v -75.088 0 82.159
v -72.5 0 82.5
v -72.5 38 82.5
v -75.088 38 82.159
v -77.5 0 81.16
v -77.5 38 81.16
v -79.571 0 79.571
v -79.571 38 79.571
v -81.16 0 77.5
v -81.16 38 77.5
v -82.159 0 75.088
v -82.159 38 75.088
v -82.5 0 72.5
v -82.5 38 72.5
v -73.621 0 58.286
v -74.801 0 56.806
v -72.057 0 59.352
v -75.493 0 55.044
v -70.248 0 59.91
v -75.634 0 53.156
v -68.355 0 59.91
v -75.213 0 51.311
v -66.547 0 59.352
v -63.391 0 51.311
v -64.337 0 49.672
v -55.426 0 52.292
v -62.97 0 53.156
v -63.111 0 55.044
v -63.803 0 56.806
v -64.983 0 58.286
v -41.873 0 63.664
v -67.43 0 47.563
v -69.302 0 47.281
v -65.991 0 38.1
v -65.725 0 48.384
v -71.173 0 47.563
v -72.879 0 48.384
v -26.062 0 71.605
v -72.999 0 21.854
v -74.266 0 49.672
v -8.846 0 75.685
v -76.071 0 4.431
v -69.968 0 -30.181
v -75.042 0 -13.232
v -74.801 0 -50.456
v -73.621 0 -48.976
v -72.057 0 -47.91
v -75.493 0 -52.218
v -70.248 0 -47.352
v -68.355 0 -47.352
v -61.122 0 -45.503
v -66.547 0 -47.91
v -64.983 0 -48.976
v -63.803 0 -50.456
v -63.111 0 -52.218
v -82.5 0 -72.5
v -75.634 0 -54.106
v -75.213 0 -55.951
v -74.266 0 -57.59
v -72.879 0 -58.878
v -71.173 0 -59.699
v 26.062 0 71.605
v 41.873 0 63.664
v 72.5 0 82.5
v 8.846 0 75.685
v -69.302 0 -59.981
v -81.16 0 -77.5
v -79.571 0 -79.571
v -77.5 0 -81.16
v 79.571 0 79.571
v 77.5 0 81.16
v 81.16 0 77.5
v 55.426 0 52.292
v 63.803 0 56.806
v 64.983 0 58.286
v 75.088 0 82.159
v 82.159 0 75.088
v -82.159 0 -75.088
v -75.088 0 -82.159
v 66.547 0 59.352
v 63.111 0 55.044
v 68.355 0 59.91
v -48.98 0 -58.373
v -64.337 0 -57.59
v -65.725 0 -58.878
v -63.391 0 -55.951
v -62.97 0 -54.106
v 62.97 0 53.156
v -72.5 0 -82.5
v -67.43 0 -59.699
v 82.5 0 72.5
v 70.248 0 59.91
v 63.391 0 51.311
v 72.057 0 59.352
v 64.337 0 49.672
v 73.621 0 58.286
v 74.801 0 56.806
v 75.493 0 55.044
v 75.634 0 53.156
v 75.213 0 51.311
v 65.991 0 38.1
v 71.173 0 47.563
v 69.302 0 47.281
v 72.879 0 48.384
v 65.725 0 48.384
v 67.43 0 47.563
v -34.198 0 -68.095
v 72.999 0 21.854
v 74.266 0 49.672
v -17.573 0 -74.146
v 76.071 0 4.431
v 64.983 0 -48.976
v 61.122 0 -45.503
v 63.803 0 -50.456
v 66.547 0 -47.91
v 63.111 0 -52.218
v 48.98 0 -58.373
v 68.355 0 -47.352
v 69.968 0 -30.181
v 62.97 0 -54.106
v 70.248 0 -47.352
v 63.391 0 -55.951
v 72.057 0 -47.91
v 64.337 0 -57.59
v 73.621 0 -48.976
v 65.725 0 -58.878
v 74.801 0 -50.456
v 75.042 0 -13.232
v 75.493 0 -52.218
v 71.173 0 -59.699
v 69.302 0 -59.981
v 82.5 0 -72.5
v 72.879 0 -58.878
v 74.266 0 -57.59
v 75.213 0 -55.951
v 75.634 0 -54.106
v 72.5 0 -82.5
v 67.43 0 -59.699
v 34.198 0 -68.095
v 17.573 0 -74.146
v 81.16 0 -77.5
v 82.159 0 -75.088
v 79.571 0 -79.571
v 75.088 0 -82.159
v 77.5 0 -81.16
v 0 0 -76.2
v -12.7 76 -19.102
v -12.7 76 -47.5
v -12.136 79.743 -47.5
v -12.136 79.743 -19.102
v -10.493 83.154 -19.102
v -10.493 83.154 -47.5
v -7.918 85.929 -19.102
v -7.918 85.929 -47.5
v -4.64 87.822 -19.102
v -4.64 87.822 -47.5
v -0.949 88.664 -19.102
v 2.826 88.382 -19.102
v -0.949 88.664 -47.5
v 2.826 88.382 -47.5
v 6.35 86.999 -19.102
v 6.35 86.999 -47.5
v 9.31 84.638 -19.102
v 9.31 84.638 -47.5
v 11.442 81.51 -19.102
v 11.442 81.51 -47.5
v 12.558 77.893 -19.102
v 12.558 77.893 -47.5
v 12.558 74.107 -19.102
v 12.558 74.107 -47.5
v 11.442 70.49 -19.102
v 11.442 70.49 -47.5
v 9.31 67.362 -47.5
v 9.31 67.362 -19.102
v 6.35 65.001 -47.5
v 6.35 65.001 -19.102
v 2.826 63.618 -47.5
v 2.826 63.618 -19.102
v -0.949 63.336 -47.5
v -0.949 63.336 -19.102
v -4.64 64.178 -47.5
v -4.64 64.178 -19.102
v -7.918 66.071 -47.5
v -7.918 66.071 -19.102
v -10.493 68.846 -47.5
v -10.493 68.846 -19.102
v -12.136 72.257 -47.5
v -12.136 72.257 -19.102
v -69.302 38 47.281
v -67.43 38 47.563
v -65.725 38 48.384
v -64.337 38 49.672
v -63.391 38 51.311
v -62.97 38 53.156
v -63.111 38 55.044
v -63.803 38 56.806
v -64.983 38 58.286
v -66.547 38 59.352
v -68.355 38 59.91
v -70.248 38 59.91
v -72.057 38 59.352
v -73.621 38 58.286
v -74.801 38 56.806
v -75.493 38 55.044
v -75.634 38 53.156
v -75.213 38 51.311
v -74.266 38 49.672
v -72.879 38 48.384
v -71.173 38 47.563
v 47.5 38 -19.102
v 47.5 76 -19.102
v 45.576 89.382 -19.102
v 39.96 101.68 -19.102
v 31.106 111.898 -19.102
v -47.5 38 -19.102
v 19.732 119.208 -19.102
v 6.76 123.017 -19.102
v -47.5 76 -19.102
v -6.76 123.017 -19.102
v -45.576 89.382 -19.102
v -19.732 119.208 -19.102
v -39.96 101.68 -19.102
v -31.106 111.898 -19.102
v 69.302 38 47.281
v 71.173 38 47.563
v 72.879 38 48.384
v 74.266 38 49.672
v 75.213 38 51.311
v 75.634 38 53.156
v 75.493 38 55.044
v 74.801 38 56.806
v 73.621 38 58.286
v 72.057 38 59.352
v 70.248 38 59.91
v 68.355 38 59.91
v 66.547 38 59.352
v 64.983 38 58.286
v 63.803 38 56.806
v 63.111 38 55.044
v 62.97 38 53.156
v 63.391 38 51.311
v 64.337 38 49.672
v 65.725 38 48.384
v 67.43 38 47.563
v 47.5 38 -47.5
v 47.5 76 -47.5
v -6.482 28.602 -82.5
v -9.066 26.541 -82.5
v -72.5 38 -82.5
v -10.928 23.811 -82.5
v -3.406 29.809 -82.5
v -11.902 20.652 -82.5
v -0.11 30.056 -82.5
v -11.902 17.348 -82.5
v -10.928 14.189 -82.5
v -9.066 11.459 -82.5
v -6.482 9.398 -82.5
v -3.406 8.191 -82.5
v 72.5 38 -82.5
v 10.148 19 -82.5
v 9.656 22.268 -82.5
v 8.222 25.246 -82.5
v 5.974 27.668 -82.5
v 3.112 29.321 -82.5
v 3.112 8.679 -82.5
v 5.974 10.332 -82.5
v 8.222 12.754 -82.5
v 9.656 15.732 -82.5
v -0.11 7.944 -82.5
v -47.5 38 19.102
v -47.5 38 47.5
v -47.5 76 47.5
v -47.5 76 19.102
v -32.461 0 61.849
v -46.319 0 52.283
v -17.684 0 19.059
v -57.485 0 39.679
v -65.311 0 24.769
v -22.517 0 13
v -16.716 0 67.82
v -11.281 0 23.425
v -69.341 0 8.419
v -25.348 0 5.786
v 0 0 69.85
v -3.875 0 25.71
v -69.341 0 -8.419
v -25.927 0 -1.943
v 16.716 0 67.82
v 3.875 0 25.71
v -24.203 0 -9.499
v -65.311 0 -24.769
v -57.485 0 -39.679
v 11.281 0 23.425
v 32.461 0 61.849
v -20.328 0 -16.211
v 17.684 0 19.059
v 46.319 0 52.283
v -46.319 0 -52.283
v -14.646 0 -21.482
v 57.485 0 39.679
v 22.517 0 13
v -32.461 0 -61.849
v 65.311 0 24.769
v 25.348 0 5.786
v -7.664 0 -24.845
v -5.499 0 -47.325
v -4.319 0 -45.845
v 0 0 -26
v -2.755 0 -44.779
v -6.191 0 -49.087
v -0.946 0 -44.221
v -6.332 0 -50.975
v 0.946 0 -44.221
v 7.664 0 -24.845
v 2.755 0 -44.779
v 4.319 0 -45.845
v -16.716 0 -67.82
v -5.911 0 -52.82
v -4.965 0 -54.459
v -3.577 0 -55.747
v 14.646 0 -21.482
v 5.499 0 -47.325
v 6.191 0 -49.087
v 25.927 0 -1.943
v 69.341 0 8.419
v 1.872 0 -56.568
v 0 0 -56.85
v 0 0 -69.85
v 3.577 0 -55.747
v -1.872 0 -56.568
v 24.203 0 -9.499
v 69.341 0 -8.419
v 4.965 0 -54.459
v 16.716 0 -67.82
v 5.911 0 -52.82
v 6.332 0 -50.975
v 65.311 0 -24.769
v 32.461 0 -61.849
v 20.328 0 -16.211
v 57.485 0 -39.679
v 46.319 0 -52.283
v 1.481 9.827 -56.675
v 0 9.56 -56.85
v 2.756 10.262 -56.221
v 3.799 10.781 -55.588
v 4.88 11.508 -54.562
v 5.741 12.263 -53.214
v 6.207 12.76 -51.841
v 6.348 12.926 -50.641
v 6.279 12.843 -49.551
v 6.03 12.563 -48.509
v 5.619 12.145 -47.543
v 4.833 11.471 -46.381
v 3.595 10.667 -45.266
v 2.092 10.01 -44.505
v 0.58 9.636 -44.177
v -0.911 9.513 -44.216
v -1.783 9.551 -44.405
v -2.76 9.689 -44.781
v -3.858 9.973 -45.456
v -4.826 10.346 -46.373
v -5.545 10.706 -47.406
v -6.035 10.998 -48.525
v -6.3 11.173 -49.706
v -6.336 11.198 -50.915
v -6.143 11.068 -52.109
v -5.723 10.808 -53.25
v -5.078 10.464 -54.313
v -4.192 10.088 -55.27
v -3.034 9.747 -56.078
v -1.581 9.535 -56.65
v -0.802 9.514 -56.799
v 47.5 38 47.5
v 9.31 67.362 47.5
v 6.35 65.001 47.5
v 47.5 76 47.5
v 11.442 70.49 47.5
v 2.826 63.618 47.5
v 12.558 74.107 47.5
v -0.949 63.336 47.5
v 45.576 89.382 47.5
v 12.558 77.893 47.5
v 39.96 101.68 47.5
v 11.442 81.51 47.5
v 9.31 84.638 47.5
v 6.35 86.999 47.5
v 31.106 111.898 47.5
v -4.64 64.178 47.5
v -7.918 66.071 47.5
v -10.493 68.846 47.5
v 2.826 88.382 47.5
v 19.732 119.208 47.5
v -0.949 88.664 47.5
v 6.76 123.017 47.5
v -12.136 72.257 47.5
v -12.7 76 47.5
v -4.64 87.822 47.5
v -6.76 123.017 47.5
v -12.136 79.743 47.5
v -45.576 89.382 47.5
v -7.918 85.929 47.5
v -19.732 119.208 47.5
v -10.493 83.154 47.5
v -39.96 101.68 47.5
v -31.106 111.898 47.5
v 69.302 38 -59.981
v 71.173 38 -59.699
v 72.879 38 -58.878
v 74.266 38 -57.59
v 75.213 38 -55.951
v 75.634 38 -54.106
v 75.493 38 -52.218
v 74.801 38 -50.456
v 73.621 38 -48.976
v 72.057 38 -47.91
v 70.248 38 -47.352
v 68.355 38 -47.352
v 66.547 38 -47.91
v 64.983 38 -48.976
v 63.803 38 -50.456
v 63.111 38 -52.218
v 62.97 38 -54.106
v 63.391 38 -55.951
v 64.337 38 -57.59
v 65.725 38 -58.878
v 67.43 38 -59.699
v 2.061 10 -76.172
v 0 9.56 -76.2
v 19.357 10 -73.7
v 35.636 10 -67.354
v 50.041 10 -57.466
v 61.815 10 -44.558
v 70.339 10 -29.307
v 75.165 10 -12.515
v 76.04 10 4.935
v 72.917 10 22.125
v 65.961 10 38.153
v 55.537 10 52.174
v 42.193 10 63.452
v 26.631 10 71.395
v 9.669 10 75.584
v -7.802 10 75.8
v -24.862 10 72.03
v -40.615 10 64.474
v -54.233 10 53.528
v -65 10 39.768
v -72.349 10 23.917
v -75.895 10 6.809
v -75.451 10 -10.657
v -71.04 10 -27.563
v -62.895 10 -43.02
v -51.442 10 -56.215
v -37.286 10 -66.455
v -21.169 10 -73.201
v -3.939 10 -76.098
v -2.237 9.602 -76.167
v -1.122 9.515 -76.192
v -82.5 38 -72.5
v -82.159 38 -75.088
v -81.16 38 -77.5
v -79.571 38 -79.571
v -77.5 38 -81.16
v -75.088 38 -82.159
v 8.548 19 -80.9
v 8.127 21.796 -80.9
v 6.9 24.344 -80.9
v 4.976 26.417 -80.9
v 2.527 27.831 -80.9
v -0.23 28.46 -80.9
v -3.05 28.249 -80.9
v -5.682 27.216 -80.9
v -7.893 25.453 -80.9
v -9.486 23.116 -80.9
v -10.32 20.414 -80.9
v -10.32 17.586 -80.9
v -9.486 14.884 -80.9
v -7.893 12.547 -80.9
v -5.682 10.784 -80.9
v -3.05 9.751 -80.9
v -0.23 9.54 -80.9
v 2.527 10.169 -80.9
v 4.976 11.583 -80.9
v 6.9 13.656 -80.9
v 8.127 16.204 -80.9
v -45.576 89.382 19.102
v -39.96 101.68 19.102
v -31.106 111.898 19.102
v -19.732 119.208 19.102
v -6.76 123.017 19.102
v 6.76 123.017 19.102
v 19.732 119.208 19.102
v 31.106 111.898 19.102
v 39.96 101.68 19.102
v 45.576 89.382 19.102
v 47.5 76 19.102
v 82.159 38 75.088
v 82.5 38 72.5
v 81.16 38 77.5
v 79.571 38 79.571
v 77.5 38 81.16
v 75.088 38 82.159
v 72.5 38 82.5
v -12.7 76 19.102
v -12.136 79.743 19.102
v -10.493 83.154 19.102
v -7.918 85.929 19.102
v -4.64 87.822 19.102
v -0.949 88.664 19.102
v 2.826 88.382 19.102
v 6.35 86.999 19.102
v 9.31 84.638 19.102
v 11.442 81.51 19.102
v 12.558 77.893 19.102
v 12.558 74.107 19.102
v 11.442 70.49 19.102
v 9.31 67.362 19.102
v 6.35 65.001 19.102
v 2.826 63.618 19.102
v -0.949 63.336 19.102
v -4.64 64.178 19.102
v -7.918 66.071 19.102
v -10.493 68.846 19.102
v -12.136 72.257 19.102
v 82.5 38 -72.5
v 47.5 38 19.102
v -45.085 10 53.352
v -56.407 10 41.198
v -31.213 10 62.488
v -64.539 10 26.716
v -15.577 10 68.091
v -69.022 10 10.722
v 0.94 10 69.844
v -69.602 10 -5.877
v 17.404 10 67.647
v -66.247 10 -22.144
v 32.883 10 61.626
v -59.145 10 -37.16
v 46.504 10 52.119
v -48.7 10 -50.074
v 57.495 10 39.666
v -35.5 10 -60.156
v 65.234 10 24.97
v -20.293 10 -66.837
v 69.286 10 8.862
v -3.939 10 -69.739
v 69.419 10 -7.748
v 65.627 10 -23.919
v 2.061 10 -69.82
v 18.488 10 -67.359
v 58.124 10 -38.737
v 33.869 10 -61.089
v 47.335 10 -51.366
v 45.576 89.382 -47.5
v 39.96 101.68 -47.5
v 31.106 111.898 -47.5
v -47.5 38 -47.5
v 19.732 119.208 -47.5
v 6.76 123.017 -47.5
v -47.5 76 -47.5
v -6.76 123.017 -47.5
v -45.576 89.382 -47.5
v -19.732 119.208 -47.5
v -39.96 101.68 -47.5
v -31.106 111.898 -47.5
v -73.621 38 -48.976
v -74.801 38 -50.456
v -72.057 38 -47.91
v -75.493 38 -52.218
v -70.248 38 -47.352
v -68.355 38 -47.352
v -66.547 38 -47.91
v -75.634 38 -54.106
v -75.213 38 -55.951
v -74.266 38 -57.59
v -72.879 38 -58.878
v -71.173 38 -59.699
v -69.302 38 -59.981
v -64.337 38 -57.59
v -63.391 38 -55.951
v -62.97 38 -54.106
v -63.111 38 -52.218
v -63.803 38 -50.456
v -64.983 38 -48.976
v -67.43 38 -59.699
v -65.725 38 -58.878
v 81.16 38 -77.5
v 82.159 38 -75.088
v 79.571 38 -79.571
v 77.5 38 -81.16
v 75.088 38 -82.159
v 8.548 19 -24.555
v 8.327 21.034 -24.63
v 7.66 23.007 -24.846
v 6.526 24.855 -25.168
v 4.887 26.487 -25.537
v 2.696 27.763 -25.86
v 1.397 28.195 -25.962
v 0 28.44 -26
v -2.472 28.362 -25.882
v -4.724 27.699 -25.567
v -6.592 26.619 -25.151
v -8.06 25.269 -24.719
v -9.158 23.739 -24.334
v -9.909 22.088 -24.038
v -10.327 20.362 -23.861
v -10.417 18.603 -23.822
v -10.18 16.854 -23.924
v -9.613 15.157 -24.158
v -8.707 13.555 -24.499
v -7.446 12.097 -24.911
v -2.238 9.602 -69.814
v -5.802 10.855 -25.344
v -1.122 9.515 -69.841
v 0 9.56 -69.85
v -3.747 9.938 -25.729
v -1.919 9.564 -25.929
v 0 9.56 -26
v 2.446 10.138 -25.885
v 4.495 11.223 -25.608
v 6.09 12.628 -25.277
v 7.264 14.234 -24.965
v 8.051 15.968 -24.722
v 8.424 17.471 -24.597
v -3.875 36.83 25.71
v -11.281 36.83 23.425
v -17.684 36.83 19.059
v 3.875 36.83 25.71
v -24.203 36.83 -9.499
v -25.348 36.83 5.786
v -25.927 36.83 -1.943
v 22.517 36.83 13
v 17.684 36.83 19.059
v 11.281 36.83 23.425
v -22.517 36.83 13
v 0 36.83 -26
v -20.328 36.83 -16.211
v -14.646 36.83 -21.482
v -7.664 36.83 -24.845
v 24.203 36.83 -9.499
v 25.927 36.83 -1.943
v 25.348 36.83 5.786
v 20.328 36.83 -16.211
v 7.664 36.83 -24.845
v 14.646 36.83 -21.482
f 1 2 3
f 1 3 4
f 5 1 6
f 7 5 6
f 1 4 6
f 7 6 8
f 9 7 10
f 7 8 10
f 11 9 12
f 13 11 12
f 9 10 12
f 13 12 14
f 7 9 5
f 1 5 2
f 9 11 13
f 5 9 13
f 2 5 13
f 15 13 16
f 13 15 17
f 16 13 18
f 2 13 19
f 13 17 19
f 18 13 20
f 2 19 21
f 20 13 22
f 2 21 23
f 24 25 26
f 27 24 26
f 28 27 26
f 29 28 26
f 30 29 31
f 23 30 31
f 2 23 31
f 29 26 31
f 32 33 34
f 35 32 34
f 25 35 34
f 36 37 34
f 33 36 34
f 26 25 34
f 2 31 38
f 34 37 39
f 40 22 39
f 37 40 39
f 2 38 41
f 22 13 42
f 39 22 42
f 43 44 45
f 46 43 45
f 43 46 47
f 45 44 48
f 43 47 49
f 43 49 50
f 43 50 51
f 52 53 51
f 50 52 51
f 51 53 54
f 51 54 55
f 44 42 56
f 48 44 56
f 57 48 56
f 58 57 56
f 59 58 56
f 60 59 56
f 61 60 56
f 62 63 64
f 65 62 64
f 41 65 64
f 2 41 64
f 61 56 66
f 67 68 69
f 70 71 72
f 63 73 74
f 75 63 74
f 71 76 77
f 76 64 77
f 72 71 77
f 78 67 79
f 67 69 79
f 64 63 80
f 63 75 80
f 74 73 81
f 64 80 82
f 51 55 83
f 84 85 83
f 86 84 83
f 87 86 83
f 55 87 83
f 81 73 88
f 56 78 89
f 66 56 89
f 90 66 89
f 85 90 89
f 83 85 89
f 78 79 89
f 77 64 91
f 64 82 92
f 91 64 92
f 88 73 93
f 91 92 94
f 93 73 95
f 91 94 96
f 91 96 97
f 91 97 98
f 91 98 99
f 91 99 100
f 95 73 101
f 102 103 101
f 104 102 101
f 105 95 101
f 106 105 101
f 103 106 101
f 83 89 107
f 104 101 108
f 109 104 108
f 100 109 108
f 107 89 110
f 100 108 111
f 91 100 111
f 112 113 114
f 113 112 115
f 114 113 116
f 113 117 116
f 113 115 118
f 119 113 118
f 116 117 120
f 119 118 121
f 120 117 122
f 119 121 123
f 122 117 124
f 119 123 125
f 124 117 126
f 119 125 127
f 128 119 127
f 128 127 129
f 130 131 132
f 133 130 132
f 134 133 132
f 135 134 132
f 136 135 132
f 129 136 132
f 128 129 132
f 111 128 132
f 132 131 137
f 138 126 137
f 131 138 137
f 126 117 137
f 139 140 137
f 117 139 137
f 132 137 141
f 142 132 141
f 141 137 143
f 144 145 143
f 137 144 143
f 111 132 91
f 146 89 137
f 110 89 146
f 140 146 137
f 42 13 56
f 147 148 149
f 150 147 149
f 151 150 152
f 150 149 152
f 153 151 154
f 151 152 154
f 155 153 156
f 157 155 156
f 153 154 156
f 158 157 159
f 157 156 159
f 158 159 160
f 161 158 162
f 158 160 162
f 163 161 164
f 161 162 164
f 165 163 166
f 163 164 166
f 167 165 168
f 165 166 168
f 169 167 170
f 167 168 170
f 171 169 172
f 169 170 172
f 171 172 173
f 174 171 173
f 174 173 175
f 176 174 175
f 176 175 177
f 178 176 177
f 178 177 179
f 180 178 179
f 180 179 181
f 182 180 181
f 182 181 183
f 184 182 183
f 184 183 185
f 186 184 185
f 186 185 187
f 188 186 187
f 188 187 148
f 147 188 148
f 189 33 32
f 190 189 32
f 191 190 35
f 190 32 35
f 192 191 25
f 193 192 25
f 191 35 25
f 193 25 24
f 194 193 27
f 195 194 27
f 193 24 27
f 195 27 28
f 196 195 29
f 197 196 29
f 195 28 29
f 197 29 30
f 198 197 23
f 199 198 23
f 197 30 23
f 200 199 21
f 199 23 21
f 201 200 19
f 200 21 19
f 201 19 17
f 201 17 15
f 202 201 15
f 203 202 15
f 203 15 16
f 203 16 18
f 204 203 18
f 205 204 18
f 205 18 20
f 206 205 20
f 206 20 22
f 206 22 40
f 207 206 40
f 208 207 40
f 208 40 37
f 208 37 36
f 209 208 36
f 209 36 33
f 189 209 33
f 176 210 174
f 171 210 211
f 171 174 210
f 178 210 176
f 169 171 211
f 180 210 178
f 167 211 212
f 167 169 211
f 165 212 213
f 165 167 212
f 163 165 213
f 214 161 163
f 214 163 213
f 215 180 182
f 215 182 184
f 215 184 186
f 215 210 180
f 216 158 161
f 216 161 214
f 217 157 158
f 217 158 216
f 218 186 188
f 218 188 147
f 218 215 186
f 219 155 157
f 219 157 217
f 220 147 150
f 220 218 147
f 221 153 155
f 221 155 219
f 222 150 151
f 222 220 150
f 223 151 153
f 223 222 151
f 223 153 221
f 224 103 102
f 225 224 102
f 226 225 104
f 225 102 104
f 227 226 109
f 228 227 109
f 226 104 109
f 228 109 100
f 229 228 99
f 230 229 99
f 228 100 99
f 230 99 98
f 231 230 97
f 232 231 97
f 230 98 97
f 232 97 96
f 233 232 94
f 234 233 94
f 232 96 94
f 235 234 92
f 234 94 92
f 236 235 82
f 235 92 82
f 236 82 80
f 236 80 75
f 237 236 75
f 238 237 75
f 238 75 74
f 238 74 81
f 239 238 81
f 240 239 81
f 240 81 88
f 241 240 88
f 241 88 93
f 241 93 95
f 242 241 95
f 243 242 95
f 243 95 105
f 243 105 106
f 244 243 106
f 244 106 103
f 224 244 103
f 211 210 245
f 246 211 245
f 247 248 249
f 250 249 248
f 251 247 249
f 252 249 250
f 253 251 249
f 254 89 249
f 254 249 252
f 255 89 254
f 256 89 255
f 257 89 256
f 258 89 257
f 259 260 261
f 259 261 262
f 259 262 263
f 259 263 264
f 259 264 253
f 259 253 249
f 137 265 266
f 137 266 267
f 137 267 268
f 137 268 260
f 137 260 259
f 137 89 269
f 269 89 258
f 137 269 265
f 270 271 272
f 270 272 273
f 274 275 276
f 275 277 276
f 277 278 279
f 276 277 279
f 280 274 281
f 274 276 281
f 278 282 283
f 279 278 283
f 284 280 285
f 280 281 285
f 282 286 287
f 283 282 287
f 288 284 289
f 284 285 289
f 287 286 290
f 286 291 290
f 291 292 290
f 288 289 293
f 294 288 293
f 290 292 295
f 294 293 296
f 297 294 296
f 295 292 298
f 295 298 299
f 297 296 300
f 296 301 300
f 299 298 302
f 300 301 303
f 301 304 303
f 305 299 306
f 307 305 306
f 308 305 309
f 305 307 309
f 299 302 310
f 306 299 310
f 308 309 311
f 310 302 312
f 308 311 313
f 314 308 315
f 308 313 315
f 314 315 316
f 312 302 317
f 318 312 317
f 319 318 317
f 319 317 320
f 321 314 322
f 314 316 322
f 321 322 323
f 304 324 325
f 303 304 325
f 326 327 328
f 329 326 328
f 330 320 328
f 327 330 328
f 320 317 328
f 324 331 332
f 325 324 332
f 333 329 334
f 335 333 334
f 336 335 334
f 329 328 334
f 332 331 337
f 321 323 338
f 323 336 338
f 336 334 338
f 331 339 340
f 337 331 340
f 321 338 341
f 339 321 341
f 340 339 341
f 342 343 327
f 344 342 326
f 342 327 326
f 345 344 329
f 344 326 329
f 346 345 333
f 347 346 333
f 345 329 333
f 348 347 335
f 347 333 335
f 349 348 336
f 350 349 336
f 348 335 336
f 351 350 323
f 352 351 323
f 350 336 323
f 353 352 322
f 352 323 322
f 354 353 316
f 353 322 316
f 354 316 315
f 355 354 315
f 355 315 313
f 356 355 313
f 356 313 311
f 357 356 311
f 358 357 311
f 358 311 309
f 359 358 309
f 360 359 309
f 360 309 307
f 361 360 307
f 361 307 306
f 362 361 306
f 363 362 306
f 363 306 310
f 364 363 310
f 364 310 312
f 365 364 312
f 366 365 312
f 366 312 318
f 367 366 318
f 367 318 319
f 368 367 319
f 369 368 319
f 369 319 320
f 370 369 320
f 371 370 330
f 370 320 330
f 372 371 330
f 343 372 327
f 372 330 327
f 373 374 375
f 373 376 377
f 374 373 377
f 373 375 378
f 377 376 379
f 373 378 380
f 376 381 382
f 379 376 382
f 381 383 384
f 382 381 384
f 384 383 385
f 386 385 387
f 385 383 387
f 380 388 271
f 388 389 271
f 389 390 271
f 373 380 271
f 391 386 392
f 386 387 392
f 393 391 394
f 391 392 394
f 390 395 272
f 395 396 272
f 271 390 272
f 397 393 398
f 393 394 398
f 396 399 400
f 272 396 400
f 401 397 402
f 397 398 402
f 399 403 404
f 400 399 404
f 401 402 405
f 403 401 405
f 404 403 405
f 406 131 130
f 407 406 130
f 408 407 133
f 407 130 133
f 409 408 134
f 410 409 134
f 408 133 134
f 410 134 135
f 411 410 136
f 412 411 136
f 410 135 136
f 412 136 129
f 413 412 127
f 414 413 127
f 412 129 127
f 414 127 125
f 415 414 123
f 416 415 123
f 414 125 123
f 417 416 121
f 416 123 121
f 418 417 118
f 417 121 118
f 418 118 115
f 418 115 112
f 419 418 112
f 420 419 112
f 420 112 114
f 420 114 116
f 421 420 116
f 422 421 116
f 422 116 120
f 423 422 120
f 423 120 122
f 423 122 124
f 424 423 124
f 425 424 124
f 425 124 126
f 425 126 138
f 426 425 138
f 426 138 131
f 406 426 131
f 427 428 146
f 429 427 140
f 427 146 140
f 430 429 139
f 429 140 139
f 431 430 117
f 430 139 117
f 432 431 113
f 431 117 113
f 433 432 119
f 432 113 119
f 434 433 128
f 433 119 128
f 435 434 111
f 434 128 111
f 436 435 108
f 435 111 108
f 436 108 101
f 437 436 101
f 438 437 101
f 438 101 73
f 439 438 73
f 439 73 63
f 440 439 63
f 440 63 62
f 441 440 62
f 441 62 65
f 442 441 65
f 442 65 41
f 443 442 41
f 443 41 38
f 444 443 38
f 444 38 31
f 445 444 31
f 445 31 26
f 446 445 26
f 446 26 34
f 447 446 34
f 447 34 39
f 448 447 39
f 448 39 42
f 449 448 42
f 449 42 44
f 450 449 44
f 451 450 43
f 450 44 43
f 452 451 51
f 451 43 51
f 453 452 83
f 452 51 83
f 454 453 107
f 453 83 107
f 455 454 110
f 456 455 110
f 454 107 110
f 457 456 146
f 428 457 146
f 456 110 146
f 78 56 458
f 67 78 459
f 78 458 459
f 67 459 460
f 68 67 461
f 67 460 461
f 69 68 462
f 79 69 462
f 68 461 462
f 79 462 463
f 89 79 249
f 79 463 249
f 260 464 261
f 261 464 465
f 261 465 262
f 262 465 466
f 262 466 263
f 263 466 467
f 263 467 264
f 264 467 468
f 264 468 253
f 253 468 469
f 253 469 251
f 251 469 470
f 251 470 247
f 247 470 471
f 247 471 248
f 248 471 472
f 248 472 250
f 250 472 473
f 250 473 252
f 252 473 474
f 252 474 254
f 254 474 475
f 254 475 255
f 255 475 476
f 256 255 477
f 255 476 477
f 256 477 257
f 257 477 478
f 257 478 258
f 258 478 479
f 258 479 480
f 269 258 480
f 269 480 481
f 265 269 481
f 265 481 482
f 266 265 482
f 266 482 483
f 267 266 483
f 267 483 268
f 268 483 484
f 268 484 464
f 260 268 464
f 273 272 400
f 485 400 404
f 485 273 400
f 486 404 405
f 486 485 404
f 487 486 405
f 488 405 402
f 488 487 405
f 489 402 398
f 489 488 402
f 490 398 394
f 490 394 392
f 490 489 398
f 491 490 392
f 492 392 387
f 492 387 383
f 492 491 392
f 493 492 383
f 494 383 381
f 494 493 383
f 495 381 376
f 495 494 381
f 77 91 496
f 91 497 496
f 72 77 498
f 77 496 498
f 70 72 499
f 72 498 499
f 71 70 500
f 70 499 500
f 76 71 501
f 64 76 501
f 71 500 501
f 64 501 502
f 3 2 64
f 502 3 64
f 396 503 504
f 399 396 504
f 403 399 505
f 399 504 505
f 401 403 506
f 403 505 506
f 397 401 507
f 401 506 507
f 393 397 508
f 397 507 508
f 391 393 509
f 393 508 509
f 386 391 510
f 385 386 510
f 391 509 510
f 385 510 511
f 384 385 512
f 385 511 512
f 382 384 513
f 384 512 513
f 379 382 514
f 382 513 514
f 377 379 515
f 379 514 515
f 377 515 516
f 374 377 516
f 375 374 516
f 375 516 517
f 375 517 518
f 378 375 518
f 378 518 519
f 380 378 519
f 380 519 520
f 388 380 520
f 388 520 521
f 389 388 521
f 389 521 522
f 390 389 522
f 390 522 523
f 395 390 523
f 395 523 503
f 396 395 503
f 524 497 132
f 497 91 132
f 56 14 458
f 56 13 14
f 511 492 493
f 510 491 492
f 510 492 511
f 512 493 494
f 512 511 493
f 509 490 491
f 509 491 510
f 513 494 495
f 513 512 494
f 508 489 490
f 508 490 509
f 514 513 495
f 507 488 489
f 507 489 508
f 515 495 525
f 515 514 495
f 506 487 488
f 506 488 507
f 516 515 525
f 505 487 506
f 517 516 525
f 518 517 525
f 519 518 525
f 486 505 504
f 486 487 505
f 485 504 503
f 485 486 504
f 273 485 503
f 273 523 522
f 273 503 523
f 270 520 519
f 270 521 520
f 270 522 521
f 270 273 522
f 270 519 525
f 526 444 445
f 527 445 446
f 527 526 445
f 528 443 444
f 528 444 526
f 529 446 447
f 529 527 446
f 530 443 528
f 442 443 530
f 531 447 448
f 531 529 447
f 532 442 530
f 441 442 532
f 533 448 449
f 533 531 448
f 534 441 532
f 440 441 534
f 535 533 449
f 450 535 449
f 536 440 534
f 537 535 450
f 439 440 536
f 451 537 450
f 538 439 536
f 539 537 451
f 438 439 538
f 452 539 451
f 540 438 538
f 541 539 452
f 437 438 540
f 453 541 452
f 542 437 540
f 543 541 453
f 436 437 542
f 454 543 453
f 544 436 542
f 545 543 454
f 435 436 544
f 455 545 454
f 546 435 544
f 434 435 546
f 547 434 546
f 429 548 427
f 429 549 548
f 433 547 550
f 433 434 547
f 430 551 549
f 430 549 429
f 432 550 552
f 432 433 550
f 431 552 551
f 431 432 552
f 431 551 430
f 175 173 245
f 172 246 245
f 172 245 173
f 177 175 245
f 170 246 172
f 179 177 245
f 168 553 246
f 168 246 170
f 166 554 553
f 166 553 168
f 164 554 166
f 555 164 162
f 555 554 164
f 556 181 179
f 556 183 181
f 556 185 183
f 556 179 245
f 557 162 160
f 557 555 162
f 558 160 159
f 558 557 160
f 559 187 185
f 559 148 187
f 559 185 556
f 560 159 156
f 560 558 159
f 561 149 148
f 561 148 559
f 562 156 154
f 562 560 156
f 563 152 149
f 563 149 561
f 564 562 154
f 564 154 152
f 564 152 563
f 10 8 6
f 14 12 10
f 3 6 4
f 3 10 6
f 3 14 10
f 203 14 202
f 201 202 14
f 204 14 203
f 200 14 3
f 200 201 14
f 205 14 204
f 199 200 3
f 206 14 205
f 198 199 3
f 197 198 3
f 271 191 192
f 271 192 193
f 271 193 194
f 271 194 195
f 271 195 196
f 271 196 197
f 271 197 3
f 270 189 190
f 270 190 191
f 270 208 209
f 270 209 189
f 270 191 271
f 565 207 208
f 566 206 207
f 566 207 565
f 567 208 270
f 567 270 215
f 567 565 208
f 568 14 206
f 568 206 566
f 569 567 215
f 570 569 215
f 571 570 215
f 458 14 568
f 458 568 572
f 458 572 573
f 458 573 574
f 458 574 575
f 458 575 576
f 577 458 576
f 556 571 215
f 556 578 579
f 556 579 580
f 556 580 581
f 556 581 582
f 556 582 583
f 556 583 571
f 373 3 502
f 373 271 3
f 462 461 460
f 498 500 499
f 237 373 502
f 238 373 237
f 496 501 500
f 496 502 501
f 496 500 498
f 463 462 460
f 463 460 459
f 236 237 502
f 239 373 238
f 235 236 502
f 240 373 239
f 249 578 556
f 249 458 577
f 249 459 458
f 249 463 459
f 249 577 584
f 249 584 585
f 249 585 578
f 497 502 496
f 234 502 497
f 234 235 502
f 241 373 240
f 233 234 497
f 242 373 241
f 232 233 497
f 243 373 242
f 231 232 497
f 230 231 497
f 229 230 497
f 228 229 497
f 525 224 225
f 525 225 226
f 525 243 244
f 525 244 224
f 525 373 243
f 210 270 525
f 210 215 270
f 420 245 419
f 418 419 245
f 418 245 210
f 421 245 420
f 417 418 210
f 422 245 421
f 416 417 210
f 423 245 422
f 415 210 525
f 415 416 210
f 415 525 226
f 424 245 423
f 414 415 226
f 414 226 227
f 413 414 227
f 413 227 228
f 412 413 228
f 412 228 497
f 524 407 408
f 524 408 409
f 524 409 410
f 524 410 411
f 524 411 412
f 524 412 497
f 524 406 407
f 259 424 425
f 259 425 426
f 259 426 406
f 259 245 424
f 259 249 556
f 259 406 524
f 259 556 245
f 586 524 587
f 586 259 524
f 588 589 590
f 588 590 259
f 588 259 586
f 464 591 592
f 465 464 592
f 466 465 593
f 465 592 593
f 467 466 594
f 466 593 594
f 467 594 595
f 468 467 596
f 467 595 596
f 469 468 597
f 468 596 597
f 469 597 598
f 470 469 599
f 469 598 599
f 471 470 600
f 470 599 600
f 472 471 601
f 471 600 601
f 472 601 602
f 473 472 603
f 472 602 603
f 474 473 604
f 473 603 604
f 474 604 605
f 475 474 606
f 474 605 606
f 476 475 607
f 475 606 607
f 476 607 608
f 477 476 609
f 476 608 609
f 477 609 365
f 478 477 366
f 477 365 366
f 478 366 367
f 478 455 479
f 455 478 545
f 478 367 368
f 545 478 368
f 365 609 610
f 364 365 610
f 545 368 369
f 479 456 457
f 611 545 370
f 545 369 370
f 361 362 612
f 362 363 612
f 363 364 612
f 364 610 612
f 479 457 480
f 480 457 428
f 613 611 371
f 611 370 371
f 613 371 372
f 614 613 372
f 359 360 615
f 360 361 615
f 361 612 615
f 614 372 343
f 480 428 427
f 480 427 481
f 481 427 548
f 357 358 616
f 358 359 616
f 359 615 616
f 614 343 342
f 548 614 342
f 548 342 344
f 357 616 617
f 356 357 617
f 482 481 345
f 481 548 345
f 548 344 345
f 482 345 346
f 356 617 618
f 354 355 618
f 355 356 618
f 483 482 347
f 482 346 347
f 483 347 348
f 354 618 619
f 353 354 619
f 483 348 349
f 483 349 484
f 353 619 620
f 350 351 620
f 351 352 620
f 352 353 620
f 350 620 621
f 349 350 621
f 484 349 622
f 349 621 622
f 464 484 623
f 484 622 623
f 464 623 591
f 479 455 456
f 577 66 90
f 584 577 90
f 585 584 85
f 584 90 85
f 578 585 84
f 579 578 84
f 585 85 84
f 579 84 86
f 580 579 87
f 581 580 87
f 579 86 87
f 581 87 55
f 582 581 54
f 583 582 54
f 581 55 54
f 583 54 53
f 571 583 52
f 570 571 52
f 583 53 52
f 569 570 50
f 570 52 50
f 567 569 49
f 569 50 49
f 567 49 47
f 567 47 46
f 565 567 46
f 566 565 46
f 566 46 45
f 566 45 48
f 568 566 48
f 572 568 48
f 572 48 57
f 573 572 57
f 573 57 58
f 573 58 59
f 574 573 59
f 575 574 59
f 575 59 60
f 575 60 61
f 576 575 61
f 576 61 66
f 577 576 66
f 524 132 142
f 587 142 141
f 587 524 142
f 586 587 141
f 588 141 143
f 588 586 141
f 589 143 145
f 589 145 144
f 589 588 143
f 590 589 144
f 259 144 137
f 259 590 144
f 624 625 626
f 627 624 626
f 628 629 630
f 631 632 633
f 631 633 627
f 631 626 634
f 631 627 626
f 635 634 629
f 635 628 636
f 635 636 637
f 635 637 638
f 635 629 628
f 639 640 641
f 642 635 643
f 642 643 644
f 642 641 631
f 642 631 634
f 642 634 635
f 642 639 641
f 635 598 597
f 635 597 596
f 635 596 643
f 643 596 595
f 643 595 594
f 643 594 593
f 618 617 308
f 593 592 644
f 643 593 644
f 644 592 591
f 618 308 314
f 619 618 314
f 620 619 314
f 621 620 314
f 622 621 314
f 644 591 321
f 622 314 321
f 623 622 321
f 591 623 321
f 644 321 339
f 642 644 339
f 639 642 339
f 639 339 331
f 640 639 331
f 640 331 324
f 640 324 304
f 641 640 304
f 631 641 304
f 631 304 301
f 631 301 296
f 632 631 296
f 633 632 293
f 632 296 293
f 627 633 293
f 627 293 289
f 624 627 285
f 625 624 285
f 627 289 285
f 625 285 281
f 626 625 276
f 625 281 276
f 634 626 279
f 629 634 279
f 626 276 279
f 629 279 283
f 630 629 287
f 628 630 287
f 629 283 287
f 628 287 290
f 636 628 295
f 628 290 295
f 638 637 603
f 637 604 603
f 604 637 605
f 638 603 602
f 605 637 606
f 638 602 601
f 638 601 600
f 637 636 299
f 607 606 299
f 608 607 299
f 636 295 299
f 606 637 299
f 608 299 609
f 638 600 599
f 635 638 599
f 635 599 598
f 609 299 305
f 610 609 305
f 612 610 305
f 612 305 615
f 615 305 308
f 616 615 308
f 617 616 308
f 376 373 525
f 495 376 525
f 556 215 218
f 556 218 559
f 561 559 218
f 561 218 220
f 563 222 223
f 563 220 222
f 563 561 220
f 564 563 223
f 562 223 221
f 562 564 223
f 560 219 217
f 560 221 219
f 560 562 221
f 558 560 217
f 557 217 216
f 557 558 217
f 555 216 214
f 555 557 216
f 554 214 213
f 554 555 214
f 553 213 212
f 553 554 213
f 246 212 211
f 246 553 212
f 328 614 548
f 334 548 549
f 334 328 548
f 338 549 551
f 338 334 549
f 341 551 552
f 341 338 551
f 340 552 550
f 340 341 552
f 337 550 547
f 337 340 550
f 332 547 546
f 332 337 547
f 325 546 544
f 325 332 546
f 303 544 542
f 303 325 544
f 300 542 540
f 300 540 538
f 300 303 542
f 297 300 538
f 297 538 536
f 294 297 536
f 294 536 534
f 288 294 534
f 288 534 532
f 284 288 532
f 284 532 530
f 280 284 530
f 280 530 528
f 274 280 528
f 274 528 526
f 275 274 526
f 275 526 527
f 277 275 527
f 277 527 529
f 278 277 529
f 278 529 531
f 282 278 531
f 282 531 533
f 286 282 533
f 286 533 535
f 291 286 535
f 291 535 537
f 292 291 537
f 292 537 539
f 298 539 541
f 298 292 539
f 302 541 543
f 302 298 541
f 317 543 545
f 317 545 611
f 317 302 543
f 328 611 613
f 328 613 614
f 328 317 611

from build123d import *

# Parameters (mm, degrees)
SKETCH1_W                              = 165
SKETCH1_H                              = 165
BOSS_EXTRUDE1_DEPTH                    = 38
SKETCH2_W                              = 95
SKETCH2_H                              = 95
BOSS_EXTRUDE2_DEPTH                    = 38
BOSS_EXTRUDE4_DEPTH                    = 95
SKETCH5_R                              = 12.7
CUT_EXTRUDE1_DEPTH                     = 198.379076905
CUT_EXTRUDE2_DEPTH                     = 222.998873871
CUT_EXTRUDE2_DEPTH_BACK                = 222.998873871
FILLET1_R                              = 10
FILLET2_R                              = 10
SKETCH9_R                              = 26
CUT_EXTRUDE3_DEPTH                     = 36.83
SKETCH10_R                             = 76.2
SKETCH10_R_2                           = 69.85
CUT_EXTRUDE4_DEPTH                     = 10
F_1_2_14_NPSM_TAPPED_HOLE1_D           = 18.9738
F_1_2_14_NPSM_TAPPED_HOLE1_DEPTH       = 63.5
F_1_2_14_NPSM_TAPPED_HOLE1_CSINK_D     = 22.1742
F_1_2_14_NPSM_TAPPED_HOLE1_CSINK_ANGLE = 90
F_1_2_14_NPSM_TAPPED_HOLE1_TIP         = 5.700304607
SKETCH13_R                             = 6.35
CUT_EXTRUDE5_DEPTH                     = 25
SKETCH14_R                             = 6.35
CUT_EXTRUDE7_DEPTH                     = 170.896291896


with BuildPart() as part:
    # Sketch1 → Boss-Extrude1 (new body)
    with BuildSketch(Plane(origin=(0, 0, 0), x_dir=(1, 0, 0), z_dir=(0, 1, 0))):
        Rectangle(SKETCH1_W, SKETCH1_H)
    extrude(amount=BOSS_EXTRUDE1_DEPTH)

    # Sketch2 → Boss-Extrude2 (add)
    with BuildSketch(Plane(origin=(0, 38, 0), x_dir=(1, 0, 0), z_dir=(0, 1, 0))):
        Rectangle(SKETCH2_W, SKETCH2_H)
    extrude(amount=BOSS_EXTRUDE2_DEPTH)

    # Sketch3 → Boss-Extrude4 (add)
    with BuildSketch(Plane(origin=(0, 0, -47.5), x_dir=(-1, 0, 0), z_dir=(0, 0, -1))):
        with BuildLine():
            Line((-47.5, 76), (47.5, 76))
            ThreePointArc((47.5, 76), (0, 123.5), (-47.5, 76))
        make_face()
    extrude(amount=-BOSS_EXTRUDE4_DEPTH)

    # Sketch5 → Cut-Extrude1 (cut, through all)
    with BuildSketch(Plane(origin=(0, 0, -47.5), x_dir=(-1, 0, 0), z_dir=(0, 0, -1))):
        with Locations((0, 76)):
            Circle(SKETCH5_R)
    extrude(amount=-CUT_EXTRUDE1_DEPTH, mode=Mode.SUBTRACT)

    # Sketch8 → Cut-Extrude2 (cut, two sides: drawn at the far end of the back side and taken through both)
    with BuildSketch(Plane(origin=(82.5, 0, 0), x_dir=(0, 0, -1), z_dir=(1, 0, 0)).offset(-CUT_EXTRUDE2_DEPTH_BACK)):
        Polygon((-19.102036328, 453.345111178), (-19.102036328, 123.5), (-19.102036328, 100.748776974), (-19.102036328, 38), (19.102036328, 38), (19.102036328, 100.748776974), (19.102036328, 123.5), (19, 123.5), (-19, 123.5), (-348.845111178, 123.5), (117.698474691, -342.899262388), (447.44154954, -13.05415121), align=None)
    extrude(amount=CUT_EXTRUDE2_DEPTH + CUT_EXTRUDE2_DEPTH_BACK, mode=Mode.SUBTRACT)

    # Fillet1
    fillet1_edges = [part.edges().sort_by_distance(p)[0] for p in [
        (82.5, 19, 82.5),
    ]]
    fillet(fillet1_edges, radius=FILLET1_R)

    # Fillet2
    fillet2_edges = [part.edges().sort_by_distance(p)[0] for p in [
        (-82.5, 19, 82.5),
        (-82.5, 19, -82.5),
        (82.5, 19, -82.5),
    ]]
    fillet(fillet2_edges, radius=FILLET2_R)

    # Sketch9 → Cut-Extrude3 (cut)
    with BuildSketch(Plane.XZ):
        with Locations(Location((0, 0, 0), (0, 0, 270))):
            Circle(SKETCH9_R)
    extrude(amount=-CUT_EXTRUDE3_DEPTH, mode=Mode.SUBTRACT)

    # Sketch10 → Cut-Extrude4 (cut)
    with BuildSketch(Plane.XZ):
        with Locations(Location((0, 0, 0), (0, 0, 270))):
            Circle(SKETCH10_R)
        with Locations(Location((0, 0, 0), (0, 0, 270))):
            Circle(SKETCH10_R_2, mode=Mode.SUBTRACT)
    extrude(amount=-CUT_EXTRUDE4_DEPTH, mode=Mode.SUBTRACT)

    # 1/2-14 NPSM Tapped Hole1
    with Locations(Plane(origin=(-0.938861221, 19, -82.5), x_dir=(-1, 0, 0), z_dir=(0, 0, -1))):
        with Locations((0, 0)):
            CounterSinkHole(F_1_2_14_NPSM_TAPPED_HOLE1_D / 2, F_1_2_14_NPSM_TAPPED_HOLE1_CSINK_D / 2, depth=F_1_2_14_NPSM_TAPPED_HOLE1_DEPTH, counter_sink_angle=F_1_2_14_NPSM_TAPPED_HOLE1_CSINK_ANGLE)
            with Locations((0, 0, -(F_1_2_14_NPSM_TAPPED_HOLE1_DEPTH + F_1_2_14_NPSM_TAPPED_HOLE1_TIP / 2))):  # 118° drill point
                Cone(0, F_1_2_14_NPSM_TAPPED_HOLE1_D / 2, F_1_2_14_NPSM_TAPPED_HOLE1_TIP, mode=Mode.SUBTRACT)

    # Sketch13 → Cut-Extrude5 (cut)
    with BuildSketch(Plane.XZ):
        with Locations(Location((0, -50.5, 0), (0, 0, 270))):
            Circle(SKETCH13_R)
    extrude(amount=-CUT_EXTRUDE5_DEPTH, mode=Mode.SUBTRACT)

    # Sketch14 → Cut-Extrude7 (cut, through all)
    with BuildSketch(Plane.XZ):
        with Locations(Location((-69.30177445, 53.630970139, 0), (0, 0, 270))):
            Circle(SKETCH14_R)
        with Locations(Location((-69.30177445, -53.630970139, 0), (0, 0, 270))):
            Circle(SKETCH14_R)
        with Locations(Location((69.30177445, -53.630970139, 0), (0, 0, 270))):
            Circle(SKETCH14_R)
        with Locations(Location((69.30177445, 53.630970139, 0), (0, 0, 270))):
            Circle(SKETCH14_R)
    extrude(amount=-CUT_EXTRUDE7_DEPTH, mode=Mode.SUBTRACT)


solid = part.part
